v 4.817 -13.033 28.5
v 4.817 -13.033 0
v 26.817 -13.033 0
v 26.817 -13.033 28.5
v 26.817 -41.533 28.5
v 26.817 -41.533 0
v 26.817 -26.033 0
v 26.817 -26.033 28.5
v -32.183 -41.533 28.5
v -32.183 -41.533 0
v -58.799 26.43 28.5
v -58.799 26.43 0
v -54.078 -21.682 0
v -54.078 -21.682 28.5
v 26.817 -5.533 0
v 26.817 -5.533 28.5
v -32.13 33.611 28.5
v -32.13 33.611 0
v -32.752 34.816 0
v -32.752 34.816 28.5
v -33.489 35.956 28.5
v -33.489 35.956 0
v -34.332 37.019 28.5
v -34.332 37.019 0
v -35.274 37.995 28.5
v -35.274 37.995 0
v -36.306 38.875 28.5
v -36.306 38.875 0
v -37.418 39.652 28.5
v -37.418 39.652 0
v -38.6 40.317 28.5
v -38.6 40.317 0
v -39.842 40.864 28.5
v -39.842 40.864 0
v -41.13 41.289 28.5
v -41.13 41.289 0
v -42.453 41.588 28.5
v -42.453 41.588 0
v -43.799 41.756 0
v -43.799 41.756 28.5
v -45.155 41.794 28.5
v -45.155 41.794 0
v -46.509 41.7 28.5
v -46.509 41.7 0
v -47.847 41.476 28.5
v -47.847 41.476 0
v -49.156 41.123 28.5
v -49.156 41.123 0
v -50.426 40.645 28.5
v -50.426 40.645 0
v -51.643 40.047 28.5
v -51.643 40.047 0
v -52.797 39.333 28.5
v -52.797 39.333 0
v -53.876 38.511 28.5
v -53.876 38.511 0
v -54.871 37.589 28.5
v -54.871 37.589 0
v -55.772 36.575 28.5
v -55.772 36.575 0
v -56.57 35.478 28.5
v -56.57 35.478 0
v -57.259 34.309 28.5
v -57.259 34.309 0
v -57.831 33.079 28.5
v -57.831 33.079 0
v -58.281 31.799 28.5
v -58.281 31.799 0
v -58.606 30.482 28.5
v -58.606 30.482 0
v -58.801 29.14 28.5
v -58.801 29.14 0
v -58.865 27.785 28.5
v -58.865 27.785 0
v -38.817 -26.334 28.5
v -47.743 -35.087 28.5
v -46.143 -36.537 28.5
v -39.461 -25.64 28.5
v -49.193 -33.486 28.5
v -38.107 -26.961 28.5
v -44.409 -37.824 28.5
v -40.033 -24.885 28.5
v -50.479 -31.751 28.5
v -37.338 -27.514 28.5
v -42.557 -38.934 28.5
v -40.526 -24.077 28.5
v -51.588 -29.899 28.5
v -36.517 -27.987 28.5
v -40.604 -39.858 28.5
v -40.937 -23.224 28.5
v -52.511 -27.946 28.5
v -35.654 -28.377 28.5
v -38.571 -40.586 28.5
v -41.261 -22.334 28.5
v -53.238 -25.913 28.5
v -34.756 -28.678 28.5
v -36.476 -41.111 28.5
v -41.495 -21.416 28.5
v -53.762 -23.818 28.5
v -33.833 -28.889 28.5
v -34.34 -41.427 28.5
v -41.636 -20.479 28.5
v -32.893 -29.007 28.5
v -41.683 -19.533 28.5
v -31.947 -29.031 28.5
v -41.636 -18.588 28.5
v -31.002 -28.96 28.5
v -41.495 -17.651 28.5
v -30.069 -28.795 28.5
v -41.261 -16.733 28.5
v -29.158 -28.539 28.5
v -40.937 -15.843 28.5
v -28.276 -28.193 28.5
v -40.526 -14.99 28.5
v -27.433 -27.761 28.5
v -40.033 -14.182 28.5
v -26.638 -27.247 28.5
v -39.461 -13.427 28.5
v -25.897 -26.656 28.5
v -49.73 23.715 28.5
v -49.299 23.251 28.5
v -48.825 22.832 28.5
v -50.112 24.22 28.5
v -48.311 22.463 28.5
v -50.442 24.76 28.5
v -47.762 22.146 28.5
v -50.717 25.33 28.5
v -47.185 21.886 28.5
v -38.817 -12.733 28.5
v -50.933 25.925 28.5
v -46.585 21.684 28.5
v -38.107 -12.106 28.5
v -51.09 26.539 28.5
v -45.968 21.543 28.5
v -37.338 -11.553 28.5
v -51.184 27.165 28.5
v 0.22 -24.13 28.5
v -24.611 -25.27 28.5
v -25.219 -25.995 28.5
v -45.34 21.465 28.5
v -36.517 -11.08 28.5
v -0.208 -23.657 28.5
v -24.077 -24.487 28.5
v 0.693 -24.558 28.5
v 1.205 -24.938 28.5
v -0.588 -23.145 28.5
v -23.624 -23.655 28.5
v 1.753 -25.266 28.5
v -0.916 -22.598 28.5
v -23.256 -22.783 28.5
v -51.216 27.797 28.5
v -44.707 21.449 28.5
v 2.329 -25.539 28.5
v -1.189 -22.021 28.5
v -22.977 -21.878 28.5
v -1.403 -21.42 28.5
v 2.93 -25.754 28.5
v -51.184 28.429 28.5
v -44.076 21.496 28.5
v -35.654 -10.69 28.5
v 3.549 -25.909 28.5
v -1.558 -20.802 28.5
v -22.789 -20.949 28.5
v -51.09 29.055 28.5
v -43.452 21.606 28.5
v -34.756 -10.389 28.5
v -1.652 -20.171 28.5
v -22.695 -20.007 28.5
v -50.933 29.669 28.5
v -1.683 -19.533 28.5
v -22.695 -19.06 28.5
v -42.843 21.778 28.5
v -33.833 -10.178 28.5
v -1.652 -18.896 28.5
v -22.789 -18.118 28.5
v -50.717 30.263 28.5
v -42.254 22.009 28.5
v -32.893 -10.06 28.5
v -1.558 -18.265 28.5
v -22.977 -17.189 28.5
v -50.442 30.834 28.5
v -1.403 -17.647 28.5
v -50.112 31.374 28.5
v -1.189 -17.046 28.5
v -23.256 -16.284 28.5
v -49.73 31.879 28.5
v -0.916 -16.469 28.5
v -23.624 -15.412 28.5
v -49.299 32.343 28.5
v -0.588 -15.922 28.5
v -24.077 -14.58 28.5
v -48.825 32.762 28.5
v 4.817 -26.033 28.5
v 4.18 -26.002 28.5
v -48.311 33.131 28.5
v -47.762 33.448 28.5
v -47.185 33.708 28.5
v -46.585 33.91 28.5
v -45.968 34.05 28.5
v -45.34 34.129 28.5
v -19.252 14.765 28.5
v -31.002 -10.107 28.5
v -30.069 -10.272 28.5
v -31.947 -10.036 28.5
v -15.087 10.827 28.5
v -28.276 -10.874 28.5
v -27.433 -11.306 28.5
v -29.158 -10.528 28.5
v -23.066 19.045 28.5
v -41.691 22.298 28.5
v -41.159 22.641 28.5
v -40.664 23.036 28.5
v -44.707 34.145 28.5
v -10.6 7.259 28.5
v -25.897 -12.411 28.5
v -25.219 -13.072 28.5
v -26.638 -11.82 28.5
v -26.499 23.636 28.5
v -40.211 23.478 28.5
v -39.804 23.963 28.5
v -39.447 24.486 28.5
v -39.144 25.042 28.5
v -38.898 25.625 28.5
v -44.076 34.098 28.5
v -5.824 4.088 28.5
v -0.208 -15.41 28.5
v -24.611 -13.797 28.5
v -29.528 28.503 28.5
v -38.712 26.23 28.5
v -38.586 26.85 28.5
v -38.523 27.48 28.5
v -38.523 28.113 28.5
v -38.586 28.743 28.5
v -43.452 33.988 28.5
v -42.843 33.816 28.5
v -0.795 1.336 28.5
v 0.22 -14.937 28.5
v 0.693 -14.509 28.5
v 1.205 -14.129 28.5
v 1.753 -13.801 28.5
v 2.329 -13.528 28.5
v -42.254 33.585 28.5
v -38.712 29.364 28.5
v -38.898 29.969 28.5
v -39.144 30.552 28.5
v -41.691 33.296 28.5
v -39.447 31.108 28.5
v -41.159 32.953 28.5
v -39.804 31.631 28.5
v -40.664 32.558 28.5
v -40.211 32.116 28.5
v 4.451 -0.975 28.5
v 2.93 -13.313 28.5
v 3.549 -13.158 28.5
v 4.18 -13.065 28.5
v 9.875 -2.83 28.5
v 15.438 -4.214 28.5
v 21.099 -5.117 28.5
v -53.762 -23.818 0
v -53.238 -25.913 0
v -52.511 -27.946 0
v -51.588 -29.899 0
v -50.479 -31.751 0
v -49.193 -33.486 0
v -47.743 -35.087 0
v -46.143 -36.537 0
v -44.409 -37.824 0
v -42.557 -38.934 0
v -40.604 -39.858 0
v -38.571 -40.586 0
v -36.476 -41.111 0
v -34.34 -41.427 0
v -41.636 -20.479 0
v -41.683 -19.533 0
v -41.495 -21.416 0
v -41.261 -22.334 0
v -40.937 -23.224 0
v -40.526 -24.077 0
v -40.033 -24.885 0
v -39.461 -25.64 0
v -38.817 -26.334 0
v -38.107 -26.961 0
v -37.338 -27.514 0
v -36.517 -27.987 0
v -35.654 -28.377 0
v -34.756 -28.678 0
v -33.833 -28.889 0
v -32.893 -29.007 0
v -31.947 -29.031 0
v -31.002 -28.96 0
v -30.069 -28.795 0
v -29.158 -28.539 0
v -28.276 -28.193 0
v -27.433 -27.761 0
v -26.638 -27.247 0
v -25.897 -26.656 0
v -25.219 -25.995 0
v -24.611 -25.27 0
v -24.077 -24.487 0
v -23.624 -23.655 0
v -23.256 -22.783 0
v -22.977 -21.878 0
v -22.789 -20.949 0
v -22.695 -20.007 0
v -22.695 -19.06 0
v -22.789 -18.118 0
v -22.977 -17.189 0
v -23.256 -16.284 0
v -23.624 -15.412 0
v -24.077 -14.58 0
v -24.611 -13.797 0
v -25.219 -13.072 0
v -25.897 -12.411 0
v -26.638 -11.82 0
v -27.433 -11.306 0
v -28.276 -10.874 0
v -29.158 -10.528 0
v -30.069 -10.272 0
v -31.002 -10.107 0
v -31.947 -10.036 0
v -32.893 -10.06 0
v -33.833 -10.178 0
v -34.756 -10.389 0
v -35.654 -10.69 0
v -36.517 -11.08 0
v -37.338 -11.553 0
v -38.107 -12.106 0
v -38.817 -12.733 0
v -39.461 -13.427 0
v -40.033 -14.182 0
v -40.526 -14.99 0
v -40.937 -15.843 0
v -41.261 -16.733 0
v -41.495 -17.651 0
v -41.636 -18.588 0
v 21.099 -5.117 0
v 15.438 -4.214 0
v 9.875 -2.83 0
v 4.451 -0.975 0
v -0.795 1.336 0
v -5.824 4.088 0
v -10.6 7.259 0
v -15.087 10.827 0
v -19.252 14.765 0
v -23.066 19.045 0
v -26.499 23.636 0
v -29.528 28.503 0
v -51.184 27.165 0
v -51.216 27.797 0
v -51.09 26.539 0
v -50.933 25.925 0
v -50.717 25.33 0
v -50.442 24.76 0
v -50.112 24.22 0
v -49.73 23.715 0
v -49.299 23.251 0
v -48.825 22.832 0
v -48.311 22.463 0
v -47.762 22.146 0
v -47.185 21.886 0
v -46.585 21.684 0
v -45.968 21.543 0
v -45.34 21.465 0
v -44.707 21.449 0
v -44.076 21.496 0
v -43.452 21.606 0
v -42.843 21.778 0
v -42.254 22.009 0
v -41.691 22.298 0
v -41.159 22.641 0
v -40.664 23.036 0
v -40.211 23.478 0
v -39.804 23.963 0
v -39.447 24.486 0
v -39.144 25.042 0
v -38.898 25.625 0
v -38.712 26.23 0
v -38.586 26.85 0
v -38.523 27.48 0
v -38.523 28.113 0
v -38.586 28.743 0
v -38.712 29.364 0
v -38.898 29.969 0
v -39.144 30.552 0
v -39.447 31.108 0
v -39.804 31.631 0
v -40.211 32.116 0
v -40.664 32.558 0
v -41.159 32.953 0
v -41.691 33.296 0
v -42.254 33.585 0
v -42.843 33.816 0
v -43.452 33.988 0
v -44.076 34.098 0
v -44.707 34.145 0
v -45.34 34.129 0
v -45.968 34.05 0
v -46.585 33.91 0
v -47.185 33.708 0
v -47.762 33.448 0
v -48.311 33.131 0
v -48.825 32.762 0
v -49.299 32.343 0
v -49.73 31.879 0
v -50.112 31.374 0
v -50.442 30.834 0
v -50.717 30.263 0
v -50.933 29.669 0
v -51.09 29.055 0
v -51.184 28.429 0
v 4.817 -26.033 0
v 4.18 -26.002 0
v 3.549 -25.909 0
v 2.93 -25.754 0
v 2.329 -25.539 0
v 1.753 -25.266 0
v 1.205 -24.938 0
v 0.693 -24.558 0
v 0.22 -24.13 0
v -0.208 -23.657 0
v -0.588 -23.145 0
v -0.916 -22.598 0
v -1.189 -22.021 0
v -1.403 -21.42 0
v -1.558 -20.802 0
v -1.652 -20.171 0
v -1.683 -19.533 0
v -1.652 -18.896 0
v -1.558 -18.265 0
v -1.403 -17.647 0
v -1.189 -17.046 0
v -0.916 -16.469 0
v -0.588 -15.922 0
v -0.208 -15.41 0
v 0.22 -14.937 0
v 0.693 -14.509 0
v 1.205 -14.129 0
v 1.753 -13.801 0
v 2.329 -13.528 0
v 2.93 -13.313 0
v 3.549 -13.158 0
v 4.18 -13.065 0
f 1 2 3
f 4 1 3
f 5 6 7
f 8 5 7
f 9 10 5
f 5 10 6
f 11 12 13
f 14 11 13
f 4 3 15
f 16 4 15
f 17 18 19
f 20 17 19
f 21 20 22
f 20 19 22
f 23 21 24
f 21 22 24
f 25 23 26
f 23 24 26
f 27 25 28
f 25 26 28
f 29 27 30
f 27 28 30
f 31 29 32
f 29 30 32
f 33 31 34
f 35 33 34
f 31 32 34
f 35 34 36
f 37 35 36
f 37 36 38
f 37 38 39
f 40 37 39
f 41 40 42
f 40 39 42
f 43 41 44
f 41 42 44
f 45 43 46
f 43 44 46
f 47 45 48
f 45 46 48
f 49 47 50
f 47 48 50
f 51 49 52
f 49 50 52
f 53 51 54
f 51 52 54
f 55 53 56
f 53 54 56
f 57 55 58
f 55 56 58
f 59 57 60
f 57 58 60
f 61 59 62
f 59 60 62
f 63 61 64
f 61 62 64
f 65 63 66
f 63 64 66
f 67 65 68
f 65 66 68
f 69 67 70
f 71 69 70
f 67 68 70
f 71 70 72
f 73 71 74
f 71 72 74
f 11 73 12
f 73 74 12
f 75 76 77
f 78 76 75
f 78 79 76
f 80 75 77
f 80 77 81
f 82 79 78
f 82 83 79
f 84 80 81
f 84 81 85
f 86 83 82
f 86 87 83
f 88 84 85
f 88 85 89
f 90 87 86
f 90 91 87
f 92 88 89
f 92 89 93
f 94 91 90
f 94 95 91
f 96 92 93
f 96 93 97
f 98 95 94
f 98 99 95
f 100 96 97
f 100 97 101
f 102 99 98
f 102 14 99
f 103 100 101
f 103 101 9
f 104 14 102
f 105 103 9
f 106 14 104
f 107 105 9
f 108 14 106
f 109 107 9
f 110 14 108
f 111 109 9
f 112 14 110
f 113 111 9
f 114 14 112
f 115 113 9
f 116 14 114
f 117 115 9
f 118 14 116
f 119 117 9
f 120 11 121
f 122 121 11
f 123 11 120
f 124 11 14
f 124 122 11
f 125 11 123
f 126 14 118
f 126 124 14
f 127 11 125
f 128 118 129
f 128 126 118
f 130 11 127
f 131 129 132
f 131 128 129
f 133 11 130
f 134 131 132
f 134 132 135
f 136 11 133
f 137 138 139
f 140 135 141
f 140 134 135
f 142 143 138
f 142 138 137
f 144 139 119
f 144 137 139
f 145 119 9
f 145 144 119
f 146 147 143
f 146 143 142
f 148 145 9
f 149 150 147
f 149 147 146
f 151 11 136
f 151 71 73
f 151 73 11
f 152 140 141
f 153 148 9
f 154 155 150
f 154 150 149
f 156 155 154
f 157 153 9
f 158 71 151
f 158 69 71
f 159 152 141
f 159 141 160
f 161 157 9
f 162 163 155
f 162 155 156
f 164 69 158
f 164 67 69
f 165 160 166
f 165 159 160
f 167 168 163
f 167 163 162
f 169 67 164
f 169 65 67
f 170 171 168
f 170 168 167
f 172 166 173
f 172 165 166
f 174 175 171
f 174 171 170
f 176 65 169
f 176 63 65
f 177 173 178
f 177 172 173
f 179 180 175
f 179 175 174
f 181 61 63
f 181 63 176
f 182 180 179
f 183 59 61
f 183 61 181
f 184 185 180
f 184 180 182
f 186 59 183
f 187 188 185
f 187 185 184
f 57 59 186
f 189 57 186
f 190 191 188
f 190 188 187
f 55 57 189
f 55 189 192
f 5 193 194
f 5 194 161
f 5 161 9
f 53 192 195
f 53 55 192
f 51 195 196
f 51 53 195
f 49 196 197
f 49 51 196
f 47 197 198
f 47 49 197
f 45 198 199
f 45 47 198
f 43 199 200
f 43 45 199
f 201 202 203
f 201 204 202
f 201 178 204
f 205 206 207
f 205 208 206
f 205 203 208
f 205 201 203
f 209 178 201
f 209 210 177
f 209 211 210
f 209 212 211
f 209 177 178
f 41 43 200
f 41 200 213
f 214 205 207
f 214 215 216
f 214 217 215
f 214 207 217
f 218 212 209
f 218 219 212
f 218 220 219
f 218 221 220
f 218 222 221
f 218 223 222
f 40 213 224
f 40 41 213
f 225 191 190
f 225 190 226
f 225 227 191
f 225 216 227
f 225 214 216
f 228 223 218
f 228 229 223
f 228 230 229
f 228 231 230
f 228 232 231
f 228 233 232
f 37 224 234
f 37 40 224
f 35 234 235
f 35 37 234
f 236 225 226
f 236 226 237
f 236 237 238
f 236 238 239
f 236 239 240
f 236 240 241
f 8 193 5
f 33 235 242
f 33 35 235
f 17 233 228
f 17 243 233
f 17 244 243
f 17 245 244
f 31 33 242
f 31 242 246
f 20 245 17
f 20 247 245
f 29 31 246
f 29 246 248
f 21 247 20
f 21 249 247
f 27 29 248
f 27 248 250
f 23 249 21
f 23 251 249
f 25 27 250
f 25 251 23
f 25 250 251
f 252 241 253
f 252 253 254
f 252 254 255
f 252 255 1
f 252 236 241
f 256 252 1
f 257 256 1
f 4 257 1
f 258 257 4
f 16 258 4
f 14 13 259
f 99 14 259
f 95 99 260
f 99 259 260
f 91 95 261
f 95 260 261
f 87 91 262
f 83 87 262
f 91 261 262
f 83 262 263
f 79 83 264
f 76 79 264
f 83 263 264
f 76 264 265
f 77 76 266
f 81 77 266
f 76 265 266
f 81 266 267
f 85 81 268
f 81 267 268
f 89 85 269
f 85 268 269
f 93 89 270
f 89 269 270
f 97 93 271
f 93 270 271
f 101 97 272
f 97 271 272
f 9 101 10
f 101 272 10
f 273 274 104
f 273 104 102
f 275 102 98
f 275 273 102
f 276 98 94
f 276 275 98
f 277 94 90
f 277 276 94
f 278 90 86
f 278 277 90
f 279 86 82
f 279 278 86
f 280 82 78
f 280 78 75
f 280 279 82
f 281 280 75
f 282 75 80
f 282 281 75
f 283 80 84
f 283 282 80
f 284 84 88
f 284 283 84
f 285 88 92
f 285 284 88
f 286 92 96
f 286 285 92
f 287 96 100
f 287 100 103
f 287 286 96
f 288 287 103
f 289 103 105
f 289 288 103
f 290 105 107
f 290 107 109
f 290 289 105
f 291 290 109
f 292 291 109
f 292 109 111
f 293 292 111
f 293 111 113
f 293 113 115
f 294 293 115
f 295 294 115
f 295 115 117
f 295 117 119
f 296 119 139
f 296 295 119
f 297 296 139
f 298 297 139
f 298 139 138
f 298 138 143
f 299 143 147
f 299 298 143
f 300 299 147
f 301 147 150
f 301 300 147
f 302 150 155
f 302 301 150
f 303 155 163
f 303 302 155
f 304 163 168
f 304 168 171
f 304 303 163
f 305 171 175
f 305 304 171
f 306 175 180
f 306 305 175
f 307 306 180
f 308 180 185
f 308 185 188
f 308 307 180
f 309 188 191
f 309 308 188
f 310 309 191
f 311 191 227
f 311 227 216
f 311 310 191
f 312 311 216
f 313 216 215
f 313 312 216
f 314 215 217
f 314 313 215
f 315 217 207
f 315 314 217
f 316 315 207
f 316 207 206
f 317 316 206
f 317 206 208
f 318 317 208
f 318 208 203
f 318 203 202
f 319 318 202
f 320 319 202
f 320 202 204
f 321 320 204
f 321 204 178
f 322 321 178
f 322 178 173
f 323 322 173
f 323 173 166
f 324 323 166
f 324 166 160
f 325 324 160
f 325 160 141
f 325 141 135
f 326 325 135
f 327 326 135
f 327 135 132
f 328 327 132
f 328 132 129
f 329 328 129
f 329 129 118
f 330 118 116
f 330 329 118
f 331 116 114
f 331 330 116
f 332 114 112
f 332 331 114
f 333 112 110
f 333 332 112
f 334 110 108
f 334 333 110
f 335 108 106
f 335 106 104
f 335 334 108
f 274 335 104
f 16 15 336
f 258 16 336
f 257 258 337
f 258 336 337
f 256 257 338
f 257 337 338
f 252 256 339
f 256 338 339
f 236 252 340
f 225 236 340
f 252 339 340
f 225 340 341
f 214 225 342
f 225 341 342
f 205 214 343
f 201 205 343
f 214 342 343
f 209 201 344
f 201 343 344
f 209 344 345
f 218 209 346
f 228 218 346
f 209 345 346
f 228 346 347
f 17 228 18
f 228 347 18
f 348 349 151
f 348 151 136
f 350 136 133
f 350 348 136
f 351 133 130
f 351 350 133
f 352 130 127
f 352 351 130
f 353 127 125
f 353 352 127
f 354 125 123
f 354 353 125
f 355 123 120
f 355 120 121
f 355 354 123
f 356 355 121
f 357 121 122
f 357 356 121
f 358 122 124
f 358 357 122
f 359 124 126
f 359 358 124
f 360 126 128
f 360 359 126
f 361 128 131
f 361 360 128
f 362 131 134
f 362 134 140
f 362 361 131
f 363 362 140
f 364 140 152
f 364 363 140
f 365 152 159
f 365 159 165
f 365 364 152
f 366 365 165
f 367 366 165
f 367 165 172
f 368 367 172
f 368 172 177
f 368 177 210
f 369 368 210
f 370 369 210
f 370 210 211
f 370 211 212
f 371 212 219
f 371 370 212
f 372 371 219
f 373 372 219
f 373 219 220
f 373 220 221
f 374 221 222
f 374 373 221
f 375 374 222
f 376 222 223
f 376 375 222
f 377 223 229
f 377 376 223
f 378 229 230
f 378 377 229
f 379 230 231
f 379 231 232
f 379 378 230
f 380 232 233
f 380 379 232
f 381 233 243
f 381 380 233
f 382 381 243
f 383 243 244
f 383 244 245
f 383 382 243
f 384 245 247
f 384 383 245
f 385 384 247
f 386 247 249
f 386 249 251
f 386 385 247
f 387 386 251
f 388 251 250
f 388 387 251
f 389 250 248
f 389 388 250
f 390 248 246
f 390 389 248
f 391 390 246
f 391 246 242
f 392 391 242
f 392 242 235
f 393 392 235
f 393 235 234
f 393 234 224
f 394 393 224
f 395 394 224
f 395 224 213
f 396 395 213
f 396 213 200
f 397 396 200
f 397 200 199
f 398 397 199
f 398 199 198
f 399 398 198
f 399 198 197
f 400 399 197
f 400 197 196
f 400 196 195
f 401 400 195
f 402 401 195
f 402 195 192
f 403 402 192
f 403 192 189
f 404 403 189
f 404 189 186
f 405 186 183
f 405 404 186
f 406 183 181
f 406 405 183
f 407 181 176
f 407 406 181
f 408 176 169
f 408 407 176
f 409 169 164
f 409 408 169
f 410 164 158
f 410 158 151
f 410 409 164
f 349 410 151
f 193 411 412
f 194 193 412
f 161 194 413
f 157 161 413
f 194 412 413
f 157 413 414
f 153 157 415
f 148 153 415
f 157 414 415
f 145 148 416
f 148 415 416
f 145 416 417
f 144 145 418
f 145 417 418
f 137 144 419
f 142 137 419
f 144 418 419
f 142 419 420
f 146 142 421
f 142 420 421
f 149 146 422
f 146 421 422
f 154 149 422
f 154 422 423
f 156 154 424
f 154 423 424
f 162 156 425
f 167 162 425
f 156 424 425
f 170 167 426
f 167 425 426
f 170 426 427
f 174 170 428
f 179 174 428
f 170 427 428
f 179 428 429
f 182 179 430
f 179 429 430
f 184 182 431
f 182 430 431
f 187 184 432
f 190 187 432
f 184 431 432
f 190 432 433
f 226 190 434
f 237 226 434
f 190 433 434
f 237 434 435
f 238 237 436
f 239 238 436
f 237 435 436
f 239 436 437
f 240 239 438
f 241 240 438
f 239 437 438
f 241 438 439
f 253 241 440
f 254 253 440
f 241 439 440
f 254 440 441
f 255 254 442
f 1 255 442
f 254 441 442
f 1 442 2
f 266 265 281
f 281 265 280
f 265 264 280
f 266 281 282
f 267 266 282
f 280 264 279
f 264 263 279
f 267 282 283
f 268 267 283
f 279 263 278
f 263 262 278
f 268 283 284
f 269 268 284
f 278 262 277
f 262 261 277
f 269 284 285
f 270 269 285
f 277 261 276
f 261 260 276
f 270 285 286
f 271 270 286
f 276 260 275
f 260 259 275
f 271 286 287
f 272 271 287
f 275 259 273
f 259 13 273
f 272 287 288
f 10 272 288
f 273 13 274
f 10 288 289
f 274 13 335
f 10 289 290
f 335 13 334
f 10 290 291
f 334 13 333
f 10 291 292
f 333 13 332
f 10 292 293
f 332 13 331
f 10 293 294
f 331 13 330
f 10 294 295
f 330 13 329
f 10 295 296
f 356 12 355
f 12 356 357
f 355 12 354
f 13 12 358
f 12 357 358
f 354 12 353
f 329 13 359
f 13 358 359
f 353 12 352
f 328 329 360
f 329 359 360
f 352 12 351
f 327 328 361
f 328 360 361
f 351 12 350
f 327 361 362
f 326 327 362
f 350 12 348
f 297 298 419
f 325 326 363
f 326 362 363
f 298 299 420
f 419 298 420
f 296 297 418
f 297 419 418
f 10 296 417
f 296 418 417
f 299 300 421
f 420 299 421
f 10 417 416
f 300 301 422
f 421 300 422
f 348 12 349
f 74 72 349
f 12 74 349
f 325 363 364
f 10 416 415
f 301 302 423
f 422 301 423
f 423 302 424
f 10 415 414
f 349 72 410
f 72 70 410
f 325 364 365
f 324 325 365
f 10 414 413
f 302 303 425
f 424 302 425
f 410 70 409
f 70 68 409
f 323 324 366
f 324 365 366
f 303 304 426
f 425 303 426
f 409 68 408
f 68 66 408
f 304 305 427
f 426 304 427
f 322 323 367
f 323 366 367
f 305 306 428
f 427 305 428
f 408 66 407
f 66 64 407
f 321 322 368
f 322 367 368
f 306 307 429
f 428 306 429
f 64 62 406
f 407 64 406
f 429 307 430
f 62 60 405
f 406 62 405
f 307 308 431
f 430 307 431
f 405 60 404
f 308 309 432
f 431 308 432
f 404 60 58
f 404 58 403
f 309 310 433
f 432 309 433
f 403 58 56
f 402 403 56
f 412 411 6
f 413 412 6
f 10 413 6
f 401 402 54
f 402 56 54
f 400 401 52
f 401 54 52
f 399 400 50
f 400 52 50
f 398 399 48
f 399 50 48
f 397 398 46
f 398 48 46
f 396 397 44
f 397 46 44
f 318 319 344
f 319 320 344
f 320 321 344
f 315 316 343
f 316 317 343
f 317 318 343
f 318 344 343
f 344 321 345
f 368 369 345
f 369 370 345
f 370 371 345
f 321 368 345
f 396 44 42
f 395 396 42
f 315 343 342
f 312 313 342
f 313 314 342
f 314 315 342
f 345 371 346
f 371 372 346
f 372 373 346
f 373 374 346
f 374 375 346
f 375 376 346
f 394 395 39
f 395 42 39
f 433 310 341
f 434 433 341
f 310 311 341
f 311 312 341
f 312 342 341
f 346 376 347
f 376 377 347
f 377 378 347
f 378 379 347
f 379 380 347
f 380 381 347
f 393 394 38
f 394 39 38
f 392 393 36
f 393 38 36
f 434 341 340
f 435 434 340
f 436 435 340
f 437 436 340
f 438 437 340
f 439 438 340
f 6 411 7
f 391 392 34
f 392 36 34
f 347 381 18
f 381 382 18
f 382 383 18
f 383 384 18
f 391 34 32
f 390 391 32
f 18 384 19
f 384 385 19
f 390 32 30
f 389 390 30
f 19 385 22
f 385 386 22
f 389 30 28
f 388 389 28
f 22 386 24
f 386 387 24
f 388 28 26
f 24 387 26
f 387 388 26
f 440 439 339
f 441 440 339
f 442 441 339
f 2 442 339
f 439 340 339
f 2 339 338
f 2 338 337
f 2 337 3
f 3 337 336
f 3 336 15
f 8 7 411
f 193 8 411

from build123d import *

# Parameters (mm, degrees)
ESQUISSE1_R        = 9.5
ESQUISSE1_R_2      = 6.35
BOSS_EXTRU_3_DEPTH = 28.5


with BuildPart() as part:
    # Esquisse1 → Boss.-Extru.3 (new body)
    with BuildSketch(Plane.XY):
        with BuildLine():
            Line((-32.183370977, -41.533470352), (26.816629023, -41.533470352))
            Line((26.816629023, -41.533470352), (26.816629023, -26.033470352))
            Line((26.816629023, -26.033470352), (4.816629023, -26.033470352))
            ThreePointArc((4.816629023, -26.033470352), (-1.683370977, -19.533470352), (4.816629023, -13.033470352))
            Line((4.816629023, -13.033470352), (26.816629023, -13.033470352))
            Line((26.816629023, -13.033470352), (26.816629023, -5.533470352))
            ThreePointArc((26.816629023, -5.533470352), (-8.245750613, 5.622429434), (-32.129953671, 33.611166634))
            ThreePointArc((-32.129953671, 33.611166634), (-48.50573191, 41.315354446), (-58.798603767, 26.429877911))
            Line((-58.798603767, 26.429877911), (-54.078241746, -21.681640278))
            ThreePointArc((-54.078241746, -21.681640278), (-46.960722933, -35.831625744), (-32.183370977, -41.533470352))
        make_face()
        with Locations(Location((-32.183370977, -19.533470352, 0), (0, 0, 180))):
            Circle(ESQUISSE1_R, mode=Mode.SUBTRACT)
        with Locations(Location((-44.865504187, 27.796895136, 0), (0, 0, 180))):
            Circle(ESQUISSE1_R_2, mode=Mode.SUBTRACT)
    extrude(amount=BOSS_EXTRU_3_DEPTH)


solid = part.part
